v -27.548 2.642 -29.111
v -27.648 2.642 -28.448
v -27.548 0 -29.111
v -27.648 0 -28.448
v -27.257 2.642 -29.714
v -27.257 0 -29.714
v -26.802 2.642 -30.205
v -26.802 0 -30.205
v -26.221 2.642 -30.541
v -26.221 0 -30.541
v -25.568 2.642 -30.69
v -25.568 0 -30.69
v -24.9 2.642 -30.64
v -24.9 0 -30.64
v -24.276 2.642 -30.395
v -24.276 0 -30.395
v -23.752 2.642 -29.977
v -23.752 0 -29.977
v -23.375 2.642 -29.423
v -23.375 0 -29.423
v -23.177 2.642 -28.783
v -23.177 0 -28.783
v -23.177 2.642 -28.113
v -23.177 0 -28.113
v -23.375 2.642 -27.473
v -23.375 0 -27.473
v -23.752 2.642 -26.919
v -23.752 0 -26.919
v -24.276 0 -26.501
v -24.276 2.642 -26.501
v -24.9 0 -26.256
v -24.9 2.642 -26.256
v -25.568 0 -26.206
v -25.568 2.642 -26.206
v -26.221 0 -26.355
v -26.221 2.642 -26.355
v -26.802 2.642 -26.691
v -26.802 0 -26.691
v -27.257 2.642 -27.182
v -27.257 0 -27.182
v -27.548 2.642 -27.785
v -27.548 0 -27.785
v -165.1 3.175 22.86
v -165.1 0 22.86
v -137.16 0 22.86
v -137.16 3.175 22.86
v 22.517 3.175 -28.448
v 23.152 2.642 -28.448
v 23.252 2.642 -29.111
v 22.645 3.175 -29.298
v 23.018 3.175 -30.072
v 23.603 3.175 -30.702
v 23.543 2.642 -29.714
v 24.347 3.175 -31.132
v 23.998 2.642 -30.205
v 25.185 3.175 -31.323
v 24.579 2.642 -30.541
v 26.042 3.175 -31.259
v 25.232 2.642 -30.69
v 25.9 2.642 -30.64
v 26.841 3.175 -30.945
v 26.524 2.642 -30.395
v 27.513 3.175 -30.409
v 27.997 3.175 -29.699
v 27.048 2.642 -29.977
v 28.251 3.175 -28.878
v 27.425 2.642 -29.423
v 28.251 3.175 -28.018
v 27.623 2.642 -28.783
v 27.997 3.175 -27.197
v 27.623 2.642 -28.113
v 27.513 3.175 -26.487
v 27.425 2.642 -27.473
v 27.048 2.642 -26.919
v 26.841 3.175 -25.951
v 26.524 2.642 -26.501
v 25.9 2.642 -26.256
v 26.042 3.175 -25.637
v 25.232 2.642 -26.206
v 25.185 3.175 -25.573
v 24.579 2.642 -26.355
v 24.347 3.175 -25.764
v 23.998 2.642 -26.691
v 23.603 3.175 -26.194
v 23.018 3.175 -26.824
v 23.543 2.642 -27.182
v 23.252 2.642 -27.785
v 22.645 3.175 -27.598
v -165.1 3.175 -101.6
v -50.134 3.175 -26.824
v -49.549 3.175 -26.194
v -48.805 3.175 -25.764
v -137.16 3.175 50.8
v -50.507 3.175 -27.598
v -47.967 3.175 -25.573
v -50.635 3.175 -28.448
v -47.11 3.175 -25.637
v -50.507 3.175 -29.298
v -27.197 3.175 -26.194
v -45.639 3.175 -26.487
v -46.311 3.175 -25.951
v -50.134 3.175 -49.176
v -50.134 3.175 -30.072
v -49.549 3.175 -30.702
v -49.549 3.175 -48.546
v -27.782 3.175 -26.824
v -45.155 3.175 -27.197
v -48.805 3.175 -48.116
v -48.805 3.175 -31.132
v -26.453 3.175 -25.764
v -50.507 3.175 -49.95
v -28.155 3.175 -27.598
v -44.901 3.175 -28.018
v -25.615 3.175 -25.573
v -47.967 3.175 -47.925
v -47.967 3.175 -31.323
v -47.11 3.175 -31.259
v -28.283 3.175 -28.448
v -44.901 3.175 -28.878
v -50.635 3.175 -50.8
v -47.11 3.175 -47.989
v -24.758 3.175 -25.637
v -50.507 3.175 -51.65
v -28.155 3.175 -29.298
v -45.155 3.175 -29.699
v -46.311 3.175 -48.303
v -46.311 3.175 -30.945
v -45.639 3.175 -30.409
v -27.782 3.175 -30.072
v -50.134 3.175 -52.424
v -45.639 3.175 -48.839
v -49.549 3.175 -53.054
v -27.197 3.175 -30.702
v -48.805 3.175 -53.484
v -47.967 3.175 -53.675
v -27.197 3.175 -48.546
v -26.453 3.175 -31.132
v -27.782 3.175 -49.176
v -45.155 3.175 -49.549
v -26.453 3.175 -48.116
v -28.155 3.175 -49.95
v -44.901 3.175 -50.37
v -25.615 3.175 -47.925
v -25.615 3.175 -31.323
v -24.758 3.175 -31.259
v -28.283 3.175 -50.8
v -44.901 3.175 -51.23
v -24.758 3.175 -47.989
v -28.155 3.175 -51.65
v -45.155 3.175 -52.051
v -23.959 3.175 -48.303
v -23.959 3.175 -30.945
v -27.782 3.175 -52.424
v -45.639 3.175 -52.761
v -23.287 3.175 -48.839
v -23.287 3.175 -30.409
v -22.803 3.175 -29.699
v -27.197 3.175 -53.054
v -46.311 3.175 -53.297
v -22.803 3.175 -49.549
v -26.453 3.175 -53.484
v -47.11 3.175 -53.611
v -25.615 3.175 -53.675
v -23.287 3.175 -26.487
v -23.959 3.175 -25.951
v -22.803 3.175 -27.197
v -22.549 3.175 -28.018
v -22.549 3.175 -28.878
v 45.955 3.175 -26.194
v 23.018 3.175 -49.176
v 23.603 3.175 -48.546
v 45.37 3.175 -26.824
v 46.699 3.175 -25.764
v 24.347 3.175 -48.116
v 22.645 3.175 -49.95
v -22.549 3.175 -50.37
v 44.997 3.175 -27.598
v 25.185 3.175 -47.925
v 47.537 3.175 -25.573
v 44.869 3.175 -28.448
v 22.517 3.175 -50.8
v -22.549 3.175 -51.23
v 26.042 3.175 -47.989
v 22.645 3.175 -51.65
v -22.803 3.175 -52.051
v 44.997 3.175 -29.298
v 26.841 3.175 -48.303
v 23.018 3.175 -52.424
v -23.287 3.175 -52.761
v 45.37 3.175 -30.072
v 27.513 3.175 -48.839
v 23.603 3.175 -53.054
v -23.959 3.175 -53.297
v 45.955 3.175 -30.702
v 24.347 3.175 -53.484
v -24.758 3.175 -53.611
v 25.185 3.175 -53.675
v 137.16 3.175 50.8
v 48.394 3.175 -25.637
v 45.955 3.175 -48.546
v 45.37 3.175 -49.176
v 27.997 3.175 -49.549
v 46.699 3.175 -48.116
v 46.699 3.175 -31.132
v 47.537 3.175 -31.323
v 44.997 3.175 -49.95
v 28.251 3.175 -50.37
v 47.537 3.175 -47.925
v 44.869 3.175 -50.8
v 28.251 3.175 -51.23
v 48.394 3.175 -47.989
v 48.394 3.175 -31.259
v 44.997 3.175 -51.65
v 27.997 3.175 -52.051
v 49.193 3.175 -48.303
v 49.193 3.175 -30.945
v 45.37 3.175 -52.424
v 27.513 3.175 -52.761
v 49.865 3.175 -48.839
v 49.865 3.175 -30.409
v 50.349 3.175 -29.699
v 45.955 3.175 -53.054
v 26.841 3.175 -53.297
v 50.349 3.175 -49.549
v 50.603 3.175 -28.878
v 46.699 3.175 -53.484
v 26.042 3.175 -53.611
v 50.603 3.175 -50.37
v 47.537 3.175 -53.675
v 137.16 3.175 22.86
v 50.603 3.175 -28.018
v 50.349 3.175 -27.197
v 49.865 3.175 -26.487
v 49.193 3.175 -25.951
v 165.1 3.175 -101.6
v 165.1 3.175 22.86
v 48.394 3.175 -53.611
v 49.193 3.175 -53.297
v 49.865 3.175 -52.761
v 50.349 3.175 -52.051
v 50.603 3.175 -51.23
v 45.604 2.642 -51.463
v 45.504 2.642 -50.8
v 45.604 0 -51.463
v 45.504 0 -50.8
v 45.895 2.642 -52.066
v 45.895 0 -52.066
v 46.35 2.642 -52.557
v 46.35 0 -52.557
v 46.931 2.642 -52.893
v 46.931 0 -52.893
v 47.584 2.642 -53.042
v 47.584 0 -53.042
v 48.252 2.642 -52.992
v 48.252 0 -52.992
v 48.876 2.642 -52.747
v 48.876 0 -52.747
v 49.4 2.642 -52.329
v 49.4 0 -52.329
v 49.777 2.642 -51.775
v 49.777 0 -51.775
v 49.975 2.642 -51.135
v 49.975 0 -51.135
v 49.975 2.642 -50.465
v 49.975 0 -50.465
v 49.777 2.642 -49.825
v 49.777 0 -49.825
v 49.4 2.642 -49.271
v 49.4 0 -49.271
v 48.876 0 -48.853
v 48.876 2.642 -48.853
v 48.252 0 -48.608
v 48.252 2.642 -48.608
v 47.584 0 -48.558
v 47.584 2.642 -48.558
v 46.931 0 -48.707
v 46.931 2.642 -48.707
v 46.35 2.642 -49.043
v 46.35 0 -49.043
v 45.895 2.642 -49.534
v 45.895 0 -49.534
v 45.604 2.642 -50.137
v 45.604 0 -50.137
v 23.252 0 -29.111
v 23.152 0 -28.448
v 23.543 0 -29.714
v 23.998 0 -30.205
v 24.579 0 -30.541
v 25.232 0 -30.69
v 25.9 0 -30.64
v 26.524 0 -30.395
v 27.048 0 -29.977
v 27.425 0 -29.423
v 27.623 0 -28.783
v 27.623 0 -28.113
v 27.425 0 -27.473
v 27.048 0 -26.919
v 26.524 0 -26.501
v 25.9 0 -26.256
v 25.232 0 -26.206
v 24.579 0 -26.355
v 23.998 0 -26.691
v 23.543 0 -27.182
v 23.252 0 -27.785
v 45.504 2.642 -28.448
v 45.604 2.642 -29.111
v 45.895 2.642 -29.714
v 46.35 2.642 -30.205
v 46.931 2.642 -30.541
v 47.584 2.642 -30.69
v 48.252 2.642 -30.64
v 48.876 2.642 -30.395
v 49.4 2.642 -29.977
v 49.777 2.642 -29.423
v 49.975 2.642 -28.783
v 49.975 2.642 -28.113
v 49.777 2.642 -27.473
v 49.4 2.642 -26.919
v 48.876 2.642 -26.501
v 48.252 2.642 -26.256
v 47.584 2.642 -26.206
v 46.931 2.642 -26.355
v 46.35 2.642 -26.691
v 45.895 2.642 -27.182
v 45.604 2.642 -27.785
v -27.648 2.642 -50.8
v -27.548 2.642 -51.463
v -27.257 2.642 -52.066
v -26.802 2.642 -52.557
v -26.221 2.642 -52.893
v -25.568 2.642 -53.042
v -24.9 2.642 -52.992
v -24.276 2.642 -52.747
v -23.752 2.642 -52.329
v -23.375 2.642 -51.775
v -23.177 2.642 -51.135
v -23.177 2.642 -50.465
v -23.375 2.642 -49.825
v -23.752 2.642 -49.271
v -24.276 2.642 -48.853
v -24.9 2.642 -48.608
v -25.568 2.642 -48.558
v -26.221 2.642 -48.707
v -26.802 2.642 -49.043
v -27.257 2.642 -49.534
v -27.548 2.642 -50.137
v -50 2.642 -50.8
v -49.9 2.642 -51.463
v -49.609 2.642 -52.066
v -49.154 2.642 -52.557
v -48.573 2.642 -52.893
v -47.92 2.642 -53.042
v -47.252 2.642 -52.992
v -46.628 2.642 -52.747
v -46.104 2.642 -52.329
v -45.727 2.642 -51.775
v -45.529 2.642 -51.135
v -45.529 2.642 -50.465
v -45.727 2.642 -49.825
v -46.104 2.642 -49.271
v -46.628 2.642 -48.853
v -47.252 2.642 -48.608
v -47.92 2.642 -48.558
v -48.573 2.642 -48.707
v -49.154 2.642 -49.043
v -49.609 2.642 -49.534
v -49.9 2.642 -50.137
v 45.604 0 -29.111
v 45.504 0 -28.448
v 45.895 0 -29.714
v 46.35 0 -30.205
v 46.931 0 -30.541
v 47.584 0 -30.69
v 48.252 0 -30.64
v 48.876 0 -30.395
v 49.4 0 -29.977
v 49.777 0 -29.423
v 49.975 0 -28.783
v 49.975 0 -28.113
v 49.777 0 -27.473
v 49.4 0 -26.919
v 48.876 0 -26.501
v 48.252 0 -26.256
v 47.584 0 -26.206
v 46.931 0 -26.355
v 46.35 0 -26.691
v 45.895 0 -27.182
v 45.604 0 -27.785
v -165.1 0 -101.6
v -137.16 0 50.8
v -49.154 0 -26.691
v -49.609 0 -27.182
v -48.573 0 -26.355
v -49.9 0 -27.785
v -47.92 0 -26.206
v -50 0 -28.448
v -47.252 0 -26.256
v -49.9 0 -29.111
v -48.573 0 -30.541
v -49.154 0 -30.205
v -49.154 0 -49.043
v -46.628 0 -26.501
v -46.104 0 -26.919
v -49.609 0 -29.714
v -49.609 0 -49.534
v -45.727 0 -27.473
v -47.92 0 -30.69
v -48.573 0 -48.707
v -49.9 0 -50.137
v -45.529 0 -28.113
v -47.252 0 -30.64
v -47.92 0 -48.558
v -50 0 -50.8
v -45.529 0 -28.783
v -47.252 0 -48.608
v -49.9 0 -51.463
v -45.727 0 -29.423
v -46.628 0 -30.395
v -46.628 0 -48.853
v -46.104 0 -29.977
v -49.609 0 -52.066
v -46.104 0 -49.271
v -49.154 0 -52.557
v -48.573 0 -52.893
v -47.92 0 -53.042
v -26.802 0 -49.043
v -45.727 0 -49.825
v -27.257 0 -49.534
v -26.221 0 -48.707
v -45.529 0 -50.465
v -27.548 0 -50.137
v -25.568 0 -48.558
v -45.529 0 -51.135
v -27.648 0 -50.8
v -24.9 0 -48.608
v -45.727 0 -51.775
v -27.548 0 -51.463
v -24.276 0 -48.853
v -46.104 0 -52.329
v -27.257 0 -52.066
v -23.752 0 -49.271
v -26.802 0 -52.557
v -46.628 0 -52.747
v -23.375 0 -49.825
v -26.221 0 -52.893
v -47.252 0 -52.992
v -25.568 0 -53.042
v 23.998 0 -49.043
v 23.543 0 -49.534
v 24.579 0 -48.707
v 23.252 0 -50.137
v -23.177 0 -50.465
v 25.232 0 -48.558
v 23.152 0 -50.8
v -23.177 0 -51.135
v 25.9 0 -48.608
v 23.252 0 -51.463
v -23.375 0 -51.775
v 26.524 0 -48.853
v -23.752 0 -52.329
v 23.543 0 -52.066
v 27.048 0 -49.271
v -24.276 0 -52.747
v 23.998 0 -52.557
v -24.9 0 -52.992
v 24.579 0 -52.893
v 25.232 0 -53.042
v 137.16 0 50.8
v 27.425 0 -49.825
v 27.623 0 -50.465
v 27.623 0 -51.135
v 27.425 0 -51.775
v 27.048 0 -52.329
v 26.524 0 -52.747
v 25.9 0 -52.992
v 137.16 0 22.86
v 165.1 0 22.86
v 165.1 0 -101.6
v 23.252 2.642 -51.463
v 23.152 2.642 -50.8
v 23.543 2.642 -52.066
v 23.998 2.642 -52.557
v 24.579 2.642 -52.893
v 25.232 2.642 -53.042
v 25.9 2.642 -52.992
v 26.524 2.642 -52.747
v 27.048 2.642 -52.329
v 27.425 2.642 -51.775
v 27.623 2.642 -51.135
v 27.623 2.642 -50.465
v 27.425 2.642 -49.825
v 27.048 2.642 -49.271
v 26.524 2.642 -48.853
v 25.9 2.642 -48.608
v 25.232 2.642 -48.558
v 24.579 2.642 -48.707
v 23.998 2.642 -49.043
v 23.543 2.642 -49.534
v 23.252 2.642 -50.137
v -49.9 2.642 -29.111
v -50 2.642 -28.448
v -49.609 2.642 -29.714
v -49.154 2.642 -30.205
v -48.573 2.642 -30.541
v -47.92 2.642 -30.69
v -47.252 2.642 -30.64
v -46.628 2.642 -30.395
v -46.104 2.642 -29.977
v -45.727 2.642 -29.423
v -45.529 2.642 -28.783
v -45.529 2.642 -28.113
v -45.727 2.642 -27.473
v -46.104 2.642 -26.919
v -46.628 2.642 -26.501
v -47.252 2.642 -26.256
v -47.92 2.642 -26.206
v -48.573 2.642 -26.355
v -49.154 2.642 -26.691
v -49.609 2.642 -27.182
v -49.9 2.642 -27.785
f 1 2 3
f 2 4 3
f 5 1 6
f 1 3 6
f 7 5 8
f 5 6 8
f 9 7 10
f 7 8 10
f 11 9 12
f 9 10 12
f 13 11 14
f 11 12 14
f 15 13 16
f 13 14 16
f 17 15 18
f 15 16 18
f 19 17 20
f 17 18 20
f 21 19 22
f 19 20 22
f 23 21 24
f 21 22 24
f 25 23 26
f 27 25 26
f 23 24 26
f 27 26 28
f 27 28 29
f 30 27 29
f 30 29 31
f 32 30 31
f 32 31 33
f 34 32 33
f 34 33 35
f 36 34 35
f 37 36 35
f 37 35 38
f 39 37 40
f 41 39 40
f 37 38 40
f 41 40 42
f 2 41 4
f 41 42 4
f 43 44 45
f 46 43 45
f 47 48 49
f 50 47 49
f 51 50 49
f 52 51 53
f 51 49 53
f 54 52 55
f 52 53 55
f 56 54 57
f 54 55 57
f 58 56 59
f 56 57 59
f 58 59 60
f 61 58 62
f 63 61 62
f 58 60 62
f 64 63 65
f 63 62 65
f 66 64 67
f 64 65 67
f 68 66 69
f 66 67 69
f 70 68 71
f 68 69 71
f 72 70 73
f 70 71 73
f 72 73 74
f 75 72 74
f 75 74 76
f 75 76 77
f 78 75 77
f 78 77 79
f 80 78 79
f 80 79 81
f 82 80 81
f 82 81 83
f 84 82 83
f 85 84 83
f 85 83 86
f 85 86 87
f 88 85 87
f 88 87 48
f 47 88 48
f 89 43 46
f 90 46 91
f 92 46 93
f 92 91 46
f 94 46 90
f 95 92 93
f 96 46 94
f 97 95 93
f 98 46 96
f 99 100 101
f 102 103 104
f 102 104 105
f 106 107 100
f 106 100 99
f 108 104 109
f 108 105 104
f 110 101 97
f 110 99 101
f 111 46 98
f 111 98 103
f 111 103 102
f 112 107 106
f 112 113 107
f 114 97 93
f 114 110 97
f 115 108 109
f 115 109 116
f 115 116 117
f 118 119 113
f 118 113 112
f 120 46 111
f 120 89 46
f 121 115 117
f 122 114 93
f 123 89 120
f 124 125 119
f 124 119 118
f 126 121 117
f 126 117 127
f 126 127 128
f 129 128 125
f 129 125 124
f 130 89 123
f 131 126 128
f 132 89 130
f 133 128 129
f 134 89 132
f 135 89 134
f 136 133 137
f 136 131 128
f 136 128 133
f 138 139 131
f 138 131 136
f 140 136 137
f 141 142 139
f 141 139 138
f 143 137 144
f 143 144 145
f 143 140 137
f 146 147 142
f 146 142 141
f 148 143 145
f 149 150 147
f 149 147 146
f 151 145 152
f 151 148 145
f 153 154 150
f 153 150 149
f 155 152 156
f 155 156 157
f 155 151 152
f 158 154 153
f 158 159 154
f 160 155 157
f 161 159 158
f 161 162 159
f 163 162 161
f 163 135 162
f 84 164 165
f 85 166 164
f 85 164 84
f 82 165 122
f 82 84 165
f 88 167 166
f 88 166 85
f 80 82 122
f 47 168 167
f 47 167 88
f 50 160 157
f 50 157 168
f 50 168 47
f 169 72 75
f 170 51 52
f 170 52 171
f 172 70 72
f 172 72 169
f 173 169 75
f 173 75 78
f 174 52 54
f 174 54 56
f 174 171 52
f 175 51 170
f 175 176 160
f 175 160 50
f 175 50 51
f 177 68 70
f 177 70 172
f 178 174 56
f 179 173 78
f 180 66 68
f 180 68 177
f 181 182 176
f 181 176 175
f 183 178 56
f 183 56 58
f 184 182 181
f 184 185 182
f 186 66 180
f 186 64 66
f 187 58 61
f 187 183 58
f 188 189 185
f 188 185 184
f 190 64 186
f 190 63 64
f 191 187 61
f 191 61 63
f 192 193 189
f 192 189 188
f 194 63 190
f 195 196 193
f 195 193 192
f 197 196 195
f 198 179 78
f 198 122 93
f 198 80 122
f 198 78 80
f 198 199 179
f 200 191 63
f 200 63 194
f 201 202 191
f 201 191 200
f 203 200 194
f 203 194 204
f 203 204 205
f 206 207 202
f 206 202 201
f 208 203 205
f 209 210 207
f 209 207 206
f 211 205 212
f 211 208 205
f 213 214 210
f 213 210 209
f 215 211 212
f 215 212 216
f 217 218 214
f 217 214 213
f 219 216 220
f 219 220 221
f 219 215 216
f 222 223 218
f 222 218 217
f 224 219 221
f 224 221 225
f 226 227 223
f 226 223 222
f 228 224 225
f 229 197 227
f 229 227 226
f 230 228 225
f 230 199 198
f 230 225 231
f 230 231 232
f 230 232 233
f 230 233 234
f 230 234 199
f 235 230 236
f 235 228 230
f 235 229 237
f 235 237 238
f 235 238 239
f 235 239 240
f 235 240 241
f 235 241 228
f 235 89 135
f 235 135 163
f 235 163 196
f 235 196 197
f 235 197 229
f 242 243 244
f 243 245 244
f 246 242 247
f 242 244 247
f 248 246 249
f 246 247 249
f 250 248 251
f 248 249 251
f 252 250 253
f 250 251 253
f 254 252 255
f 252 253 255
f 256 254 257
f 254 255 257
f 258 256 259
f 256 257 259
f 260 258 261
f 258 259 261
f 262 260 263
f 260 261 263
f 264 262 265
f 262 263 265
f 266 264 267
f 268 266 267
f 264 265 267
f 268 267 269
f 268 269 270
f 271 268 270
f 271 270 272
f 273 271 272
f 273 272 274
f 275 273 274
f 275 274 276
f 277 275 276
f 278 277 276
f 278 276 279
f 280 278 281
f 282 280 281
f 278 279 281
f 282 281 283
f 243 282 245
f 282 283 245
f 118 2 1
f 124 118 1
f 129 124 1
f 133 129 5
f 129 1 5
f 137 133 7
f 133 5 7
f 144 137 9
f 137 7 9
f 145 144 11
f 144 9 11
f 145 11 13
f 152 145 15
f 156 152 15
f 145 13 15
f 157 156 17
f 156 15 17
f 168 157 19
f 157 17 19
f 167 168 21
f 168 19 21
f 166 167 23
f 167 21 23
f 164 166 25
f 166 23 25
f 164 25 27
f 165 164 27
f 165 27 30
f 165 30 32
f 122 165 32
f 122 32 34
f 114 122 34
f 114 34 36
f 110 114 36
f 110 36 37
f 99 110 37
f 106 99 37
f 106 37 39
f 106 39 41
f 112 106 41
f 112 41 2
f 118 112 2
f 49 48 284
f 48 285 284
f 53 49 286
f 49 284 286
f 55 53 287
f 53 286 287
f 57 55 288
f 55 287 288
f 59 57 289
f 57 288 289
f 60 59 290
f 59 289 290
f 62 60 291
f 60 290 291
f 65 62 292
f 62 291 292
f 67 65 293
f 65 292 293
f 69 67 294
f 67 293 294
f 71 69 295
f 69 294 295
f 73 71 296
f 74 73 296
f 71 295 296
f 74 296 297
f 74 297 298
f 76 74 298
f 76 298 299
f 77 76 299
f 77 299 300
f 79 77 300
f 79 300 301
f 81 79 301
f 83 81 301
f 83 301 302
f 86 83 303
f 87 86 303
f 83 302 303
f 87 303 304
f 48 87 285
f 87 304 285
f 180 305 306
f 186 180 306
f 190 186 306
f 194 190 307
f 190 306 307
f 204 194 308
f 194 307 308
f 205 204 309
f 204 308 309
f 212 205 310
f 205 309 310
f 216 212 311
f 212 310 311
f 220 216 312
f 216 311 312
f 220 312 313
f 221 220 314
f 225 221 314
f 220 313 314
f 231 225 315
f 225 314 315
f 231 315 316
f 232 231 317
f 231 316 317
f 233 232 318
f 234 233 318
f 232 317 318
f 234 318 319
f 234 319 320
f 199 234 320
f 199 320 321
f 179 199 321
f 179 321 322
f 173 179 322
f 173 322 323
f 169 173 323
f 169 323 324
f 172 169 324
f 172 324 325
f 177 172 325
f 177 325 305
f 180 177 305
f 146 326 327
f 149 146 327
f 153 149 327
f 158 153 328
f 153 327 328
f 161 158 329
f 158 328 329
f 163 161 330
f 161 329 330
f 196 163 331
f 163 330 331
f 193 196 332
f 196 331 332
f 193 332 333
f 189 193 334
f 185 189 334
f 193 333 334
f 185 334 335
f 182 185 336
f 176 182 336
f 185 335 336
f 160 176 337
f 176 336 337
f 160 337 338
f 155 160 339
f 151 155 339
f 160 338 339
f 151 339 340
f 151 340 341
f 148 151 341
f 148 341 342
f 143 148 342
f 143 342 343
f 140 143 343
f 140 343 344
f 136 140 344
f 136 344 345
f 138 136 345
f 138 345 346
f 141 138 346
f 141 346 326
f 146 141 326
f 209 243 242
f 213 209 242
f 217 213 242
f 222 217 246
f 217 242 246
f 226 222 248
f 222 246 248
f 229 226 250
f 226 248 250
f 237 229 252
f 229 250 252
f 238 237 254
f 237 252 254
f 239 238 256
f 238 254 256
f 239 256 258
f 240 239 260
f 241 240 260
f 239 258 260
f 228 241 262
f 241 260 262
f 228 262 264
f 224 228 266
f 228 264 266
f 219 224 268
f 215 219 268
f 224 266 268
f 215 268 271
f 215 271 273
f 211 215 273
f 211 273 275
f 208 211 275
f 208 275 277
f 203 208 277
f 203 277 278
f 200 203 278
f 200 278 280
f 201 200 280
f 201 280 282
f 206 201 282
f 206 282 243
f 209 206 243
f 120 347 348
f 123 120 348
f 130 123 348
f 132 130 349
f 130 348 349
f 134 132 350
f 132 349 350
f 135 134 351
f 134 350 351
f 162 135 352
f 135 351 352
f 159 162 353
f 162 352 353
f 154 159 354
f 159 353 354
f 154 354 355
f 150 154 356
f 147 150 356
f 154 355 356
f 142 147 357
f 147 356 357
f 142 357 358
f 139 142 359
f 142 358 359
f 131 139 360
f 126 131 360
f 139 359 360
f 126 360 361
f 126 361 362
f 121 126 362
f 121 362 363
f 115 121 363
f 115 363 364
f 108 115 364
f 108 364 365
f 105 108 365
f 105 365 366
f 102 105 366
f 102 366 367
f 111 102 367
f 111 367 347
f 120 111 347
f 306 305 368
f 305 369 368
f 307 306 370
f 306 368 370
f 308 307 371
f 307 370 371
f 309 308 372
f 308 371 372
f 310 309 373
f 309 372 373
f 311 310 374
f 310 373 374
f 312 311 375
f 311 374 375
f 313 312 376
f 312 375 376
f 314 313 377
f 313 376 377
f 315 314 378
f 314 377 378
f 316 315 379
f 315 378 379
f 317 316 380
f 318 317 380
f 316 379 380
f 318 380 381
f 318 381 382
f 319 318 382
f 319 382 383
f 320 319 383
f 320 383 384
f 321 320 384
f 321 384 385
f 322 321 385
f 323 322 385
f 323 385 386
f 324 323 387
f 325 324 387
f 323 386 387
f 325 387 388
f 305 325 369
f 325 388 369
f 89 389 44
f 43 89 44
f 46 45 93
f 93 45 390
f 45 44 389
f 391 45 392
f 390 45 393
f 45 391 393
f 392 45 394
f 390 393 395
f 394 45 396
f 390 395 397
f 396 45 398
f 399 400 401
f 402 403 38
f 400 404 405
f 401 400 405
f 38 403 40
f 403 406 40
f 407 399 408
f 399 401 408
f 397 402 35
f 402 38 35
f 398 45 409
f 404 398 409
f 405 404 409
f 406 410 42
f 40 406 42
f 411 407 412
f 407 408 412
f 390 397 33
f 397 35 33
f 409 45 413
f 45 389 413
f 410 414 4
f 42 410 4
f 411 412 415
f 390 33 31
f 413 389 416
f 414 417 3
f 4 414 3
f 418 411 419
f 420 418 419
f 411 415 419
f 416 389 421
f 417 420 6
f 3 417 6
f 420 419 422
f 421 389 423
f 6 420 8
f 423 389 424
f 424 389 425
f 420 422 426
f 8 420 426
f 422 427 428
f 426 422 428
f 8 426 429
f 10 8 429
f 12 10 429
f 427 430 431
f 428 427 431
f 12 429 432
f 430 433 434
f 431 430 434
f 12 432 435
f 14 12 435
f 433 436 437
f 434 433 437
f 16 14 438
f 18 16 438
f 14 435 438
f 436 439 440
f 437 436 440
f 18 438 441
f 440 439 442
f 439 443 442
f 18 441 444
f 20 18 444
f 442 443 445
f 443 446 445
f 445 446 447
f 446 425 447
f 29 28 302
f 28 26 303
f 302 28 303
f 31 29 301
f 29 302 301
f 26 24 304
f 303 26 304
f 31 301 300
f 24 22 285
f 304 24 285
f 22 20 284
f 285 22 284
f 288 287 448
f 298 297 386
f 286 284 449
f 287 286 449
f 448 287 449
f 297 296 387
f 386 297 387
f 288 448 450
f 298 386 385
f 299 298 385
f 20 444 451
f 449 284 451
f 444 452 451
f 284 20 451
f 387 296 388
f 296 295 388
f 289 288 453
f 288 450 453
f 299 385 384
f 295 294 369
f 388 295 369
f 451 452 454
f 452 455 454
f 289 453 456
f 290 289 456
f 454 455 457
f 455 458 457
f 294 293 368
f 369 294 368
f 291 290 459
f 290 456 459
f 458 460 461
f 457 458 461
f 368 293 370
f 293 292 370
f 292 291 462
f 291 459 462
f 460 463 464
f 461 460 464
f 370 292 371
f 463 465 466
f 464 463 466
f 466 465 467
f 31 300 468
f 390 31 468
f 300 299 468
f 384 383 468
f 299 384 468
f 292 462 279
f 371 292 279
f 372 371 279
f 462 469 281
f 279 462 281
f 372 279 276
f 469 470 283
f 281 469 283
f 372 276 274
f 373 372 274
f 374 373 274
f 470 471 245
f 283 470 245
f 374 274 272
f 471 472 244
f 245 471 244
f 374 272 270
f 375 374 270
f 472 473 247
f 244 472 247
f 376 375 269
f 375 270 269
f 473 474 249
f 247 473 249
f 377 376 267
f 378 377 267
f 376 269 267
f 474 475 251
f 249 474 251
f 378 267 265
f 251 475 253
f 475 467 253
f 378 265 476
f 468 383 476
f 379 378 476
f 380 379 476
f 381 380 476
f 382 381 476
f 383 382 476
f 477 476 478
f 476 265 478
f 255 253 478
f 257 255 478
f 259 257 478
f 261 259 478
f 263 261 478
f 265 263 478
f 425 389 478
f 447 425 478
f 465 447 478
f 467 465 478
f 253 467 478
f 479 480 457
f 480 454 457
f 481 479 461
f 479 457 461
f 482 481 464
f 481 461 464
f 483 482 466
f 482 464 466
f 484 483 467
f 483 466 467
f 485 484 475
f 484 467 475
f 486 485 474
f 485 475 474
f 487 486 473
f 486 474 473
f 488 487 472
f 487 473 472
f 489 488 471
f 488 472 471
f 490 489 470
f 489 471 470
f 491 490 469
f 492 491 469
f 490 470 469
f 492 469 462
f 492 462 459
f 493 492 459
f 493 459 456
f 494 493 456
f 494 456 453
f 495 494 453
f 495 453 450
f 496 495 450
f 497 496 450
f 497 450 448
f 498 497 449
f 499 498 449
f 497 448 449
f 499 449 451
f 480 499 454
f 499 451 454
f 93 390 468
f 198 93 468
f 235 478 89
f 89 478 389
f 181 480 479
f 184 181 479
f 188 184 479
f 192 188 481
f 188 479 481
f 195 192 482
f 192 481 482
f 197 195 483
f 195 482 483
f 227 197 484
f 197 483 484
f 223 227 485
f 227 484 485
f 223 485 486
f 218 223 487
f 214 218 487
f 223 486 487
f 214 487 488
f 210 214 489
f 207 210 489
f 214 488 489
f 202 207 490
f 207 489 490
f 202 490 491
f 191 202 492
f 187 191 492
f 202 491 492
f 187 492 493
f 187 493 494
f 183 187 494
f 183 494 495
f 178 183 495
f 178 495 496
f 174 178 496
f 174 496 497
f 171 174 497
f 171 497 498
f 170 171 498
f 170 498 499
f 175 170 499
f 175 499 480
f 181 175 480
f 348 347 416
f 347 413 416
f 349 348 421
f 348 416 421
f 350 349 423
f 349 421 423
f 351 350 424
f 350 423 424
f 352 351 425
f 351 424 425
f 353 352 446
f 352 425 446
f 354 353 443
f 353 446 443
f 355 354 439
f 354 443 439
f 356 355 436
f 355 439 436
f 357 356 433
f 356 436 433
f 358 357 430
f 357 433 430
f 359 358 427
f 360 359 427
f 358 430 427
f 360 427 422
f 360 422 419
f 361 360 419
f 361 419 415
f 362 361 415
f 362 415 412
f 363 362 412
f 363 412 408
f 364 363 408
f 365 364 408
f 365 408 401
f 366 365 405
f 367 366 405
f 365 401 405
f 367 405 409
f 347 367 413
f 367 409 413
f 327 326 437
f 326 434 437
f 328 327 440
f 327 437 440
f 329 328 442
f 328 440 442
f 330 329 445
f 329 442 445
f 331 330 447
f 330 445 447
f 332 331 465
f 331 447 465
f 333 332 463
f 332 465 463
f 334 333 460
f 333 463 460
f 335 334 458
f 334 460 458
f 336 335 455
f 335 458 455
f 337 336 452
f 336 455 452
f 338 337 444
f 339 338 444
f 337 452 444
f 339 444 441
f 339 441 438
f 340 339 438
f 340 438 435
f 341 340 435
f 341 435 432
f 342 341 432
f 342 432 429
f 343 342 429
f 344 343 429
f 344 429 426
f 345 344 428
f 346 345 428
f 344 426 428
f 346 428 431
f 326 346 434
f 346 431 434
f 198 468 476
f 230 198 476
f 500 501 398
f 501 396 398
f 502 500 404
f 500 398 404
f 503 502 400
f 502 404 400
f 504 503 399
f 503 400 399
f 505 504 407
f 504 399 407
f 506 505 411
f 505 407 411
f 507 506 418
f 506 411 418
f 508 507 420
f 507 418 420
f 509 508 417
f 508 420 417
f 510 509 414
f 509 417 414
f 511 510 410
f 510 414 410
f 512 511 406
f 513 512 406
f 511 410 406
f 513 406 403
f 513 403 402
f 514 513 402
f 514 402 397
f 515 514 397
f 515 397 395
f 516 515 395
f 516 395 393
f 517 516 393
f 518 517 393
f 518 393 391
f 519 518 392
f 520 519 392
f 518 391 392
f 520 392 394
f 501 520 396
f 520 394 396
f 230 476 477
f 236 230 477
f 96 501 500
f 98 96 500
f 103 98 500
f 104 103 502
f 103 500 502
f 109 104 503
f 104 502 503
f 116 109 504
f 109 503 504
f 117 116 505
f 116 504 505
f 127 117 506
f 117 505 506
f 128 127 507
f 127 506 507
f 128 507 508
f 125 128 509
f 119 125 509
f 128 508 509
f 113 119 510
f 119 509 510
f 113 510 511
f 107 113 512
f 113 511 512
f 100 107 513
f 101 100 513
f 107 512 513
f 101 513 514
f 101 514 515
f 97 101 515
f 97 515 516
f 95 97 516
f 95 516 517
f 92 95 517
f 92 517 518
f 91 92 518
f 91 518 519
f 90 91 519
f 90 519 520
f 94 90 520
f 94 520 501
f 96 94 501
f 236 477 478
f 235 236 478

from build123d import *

# Parameters (mm, degrees)
BOSS_EXTRUDE1_DEPTH                   = 3.175
F_16_0_177_DIAMETER_HOLE1_D           = 4.4958
F_16_0_177_DIAMETER_HOLE1_DEPTH       = 3.175
F_16_0_177_DIAMETER_HOLE1_CSINK_D     = 5.7658
F_16_0_177_DIAMETER_HOLE1_CSINK_ANGLE = 100
F_16_0_177_DIAMETER_HOLE1_TIP         = 1.350674586


with BuildPart() as part:
    # Sketch1 → Boss-Extrude1 (new body)
    with BuildSketch(Plane(origin=(0, 0, 0), x_dir=(1, 0, 0), z_dir=(0, 1, 0))):
        Polygon((-137.16, -50.8), (137.16, -50.8), (137.16, -22.86), (165.1, -22.86), (165.1, 101.6), (-165.1, 101.6), (-165.1, -22.86), (-137.16, -22.86), align=None)
    extrude(amount=BOSS_EXTRUDE1_DEPTH)

    # #16 (0.177) Diameter Hole1
    with Locations(Plane(origin=(0, 3.175, 0), x_dir=(1, 0, 0), z_dir=(0, 1, 0))):
        with Locations((-47.752, 50.8), (-25.4, 50.8), (-25.4, 28.448), (-47.752, 28.448), (25.4, 28.448), (25.4, 50.8), (47.752, 50.8), (47.752, 28.448)):
            CounterSinkHole(F_16_0_177_DIAMETER_HOLE1_D / 2, F_16_0_177_DIAMETER_HOLE1_CSINK_D / 2, depth=F_16_0_177_DIAMETER_HOLE1_DEPTH, counter_sink_angle=F_16_0_177_DIAMETER_HOLE1_CSINK_ANGLE)
            with Locations((0, 0, -(F_16_0_177_DIAMETER_HOLE1_DEPTH + F_16_0_177_DIAMETER_HOLE1_TIP / 2))):  # 118° drill point
                Cone(0, F_16_0_177_DIAMETER_HOLE1_D / 2, F_16_0_177_DIAMETER_HOLE1_TIP, mode=Mode.SUBTRACT)


solid = part.part
